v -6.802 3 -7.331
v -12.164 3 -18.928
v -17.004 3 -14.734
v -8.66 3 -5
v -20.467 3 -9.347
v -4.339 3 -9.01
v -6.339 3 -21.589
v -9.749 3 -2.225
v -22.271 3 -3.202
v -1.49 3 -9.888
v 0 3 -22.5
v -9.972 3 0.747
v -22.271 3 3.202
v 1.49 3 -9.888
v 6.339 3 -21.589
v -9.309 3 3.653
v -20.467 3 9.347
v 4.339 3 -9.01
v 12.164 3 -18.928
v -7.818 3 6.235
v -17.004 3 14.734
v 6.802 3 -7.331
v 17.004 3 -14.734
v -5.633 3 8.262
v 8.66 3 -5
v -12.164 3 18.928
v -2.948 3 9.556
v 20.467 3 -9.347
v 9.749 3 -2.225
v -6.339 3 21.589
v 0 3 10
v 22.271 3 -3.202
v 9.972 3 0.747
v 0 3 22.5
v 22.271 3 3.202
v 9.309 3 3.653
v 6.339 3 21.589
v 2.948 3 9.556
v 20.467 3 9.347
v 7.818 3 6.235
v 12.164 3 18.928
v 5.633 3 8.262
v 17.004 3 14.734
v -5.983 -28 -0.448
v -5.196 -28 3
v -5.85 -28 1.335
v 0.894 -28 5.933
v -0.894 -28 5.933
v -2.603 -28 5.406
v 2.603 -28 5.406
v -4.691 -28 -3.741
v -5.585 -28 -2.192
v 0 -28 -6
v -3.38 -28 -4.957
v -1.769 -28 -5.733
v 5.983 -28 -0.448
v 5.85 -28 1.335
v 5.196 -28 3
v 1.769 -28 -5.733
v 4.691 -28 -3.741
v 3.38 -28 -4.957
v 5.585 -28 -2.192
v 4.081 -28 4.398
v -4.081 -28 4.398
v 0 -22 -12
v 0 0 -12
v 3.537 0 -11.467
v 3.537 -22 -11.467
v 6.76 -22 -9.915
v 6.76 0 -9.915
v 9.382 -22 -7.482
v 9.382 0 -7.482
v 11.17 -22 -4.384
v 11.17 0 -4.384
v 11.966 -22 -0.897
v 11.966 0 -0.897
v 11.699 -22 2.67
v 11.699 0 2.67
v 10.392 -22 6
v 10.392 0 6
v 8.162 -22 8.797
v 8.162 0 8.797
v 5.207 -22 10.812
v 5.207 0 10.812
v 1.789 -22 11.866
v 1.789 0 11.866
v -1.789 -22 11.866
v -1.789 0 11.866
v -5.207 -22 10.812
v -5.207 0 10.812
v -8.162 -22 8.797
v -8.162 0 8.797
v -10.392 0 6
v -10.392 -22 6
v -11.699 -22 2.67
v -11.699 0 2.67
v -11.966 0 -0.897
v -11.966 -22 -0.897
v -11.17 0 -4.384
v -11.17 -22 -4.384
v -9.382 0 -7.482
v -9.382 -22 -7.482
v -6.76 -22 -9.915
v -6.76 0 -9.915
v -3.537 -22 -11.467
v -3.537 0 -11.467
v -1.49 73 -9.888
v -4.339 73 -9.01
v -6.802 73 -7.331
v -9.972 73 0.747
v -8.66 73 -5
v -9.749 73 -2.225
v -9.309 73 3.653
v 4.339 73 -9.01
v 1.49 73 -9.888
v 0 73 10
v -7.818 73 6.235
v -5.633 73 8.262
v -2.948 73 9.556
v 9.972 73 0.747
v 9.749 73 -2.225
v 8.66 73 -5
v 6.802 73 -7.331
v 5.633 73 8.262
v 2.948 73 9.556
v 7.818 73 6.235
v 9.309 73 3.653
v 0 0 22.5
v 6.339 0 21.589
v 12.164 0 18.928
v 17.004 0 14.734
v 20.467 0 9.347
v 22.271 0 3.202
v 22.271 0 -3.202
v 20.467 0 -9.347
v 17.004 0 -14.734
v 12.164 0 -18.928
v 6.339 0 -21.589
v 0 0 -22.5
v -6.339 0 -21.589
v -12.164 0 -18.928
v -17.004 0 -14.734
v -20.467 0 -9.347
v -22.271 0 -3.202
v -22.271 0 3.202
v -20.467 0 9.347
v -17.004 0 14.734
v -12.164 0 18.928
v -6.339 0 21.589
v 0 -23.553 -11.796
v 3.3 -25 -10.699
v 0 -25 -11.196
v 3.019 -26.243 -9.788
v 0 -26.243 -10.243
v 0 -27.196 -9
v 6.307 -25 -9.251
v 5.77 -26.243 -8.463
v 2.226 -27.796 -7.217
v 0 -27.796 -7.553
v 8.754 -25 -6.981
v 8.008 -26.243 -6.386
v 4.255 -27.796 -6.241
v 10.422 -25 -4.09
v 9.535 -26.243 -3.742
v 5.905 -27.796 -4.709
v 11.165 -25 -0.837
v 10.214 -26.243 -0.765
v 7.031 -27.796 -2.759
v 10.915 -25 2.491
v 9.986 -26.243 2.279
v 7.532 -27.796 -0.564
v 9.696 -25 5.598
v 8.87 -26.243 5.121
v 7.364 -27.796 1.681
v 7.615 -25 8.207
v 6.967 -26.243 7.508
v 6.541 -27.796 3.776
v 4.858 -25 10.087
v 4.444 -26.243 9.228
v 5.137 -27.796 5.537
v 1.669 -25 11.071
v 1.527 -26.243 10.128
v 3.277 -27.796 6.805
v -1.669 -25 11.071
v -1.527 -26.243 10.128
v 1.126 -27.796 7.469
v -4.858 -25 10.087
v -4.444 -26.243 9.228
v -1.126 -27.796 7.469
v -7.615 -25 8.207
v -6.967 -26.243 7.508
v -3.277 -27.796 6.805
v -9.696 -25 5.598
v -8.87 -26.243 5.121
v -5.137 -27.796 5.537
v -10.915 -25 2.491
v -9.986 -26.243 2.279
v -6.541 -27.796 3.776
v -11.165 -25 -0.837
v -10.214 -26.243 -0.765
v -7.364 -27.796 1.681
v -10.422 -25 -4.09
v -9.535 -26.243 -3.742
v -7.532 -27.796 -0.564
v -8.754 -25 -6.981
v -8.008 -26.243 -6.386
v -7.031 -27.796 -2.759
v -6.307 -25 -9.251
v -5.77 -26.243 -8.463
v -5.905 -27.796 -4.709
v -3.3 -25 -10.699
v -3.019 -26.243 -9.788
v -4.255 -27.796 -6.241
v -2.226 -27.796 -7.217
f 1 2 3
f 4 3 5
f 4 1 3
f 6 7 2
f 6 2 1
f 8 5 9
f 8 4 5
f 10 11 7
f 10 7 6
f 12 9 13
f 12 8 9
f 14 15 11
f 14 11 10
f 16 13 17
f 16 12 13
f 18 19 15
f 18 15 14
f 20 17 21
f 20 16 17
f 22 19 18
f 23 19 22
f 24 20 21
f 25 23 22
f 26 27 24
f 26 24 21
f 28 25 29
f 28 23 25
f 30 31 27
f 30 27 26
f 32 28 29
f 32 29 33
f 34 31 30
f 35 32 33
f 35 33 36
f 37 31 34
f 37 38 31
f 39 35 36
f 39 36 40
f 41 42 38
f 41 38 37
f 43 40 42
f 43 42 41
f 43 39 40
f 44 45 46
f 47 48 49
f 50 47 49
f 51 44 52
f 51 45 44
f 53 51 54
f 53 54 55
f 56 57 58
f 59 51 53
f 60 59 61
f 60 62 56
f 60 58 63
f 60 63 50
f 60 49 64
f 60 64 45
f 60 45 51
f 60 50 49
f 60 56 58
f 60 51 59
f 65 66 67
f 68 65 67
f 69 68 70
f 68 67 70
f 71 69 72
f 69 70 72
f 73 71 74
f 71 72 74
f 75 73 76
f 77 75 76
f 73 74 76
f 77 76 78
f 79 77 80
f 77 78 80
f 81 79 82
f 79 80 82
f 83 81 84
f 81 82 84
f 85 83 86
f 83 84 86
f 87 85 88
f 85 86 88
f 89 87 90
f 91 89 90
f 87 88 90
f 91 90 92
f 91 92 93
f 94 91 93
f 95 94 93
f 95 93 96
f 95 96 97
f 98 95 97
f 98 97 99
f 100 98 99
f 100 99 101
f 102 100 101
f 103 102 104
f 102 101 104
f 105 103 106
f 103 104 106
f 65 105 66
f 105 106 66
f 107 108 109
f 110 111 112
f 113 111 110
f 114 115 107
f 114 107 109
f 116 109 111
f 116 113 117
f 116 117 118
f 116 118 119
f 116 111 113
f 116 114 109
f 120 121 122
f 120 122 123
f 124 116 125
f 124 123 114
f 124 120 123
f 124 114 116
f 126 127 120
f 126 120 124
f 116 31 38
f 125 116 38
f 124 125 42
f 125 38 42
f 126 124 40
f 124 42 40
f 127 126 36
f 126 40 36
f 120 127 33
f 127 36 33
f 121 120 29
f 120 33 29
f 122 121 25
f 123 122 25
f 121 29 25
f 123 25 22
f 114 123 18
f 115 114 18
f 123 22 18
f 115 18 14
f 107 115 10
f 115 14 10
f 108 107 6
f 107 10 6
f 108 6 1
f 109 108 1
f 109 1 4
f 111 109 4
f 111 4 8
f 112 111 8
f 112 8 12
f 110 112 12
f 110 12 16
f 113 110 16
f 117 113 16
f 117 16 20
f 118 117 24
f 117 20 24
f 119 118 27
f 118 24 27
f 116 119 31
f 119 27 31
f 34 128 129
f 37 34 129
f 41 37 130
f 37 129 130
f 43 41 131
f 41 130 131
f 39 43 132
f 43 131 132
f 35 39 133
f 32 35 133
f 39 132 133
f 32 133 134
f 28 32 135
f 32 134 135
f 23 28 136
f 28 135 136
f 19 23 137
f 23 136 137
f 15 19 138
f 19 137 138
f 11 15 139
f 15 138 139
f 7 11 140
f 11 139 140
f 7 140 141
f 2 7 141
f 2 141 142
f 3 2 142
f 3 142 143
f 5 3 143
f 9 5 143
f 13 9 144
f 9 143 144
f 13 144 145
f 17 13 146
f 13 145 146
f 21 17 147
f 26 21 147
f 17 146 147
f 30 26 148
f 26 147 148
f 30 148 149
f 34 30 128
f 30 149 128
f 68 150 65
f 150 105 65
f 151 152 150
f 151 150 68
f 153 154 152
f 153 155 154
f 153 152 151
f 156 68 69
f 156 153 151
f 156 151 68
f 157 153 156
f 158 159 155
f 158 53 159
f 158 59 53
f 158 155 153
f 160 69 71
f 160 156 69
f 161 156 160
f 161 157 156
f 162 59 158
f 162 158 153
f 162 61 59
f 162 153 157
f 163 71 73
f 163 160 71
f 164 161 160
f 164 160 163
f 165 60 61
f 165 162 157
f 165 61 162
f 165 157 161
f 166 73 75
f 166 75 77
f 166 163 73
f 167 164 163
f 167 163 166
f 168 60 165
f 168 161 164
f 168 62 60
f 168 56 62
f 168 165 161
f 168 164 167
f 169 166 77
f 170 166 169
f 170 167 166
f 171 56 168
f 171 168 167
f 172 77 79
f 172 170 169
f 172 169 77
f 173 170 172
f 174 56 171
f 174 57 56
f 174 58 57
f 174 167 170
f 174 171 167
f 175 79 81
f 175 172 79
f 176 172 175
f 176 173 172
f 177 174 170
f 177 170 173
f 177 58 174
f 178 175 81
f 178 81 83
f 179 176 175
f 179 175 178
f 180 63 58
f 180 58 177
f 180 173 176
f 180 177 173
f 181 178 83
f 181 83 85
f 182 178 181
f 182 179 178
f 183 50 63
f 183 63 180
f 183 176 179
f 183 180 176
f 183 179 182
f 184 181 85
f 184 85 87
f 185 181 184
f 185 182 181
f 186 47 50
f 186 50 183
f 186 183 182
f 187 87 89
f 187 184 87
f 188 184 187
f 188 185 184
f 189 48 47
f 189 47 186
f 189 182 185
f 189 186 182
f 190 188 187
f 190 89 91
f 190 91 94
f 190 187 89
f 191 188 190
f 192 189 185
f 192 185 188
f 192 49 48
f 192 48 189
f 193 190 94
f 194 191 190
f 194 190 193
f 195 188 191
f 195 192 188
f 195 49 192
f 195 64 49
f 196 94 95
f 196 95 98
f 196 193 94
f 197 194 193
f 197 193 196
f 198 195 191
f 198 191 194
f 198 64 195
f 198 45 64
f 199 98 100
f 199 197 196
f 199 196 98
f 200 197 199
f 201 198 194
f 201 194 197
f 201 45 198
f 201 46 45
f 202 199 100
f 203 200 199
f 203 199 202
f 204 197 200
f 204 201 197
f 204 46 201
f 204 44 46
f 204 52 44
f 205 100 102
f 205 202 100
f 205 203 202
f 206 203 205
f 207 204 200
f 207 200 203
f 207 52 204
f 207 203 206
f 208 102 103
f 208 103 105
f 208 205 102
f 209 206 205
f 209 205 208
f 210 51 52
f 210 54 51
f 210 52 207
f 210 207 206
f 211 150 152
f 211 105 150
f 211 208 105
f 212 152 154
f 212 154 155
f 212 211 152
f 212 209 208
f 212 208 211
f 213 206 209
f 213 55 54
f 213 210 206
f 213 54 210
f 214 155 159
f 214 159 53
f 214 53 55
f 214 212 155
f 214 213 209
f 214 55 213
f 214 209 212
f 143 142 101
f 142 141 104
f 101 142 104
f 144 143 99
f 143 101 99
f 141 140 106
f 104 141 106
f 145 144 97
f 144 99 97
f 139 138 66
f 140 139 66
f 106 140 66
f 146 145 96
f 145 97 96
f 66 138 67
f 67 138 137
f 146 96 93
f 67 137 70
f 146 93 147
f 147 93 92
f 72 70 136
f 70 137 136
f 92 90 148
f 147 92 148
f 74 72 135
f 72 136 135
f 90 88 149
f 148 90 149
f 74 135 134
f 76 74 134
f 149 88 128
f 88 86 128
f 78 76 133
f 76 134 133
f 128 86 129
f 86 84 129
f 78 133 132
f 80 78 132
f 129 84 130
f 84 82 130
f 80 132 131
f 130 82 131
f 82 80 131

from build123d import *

# Parameters (mm, degrees)
SKETCH1_R           = 22.5
BOSS_EXTRUDE3_DEPTH = 3
SKETCH2_R           = 10
BOSS_EXTRUDE5_DEPTH = 70
SKETCH5_R           = 12
BOSS_EXTRUDE6_DEPTH = 28
FILLET1_R           = 6


with BuildPart() as part:
    # Sketch1 → Boss-Extrude3 (new body)
    with BuildSketch(Plane(origin=(0, 0, 0), x_dir=(1, 0, 0), z_dir=(0, 1, 0))):
        with Locations(Location((0, 0, 0), (0, 0, 270))):
            Circle(SKETCH1_R)
    extrude(amount=BOSS_EXTRUDE3_DEPTH)

    # Sketch2 → Boss-Extrude5 (add)
    with BuildSketch(Plane(origin=(0, 3, 0), x_dir=(1, 0, 0), z_dir=(0, 1, 0))):
        with Locations(Location((0, 0, 0), (0, 0, 270))):
            Circle(SKETCH2_R)
    extrude(amount=BOSS_EXTRUDE5_DEPTH)

    # Sketch5 → Boss-Extrude6 (add)
    with BuildSketch(Plane.XZ):
        with Locations(Location((0, 0, 0), (0, 0, 270))):
            Circle(SKETCH5_R)
    extrude(amount=BOSS_EXTRUDE6_DEPTH)

    # Fillet1
    fillet1_edges = [part.edges().sort_by_distance(p)[0] for p in [
        (0, -28, 12),
    ]]
    fillet(fillet1_edges, radius=FILLET1_R)


solid = part.part
